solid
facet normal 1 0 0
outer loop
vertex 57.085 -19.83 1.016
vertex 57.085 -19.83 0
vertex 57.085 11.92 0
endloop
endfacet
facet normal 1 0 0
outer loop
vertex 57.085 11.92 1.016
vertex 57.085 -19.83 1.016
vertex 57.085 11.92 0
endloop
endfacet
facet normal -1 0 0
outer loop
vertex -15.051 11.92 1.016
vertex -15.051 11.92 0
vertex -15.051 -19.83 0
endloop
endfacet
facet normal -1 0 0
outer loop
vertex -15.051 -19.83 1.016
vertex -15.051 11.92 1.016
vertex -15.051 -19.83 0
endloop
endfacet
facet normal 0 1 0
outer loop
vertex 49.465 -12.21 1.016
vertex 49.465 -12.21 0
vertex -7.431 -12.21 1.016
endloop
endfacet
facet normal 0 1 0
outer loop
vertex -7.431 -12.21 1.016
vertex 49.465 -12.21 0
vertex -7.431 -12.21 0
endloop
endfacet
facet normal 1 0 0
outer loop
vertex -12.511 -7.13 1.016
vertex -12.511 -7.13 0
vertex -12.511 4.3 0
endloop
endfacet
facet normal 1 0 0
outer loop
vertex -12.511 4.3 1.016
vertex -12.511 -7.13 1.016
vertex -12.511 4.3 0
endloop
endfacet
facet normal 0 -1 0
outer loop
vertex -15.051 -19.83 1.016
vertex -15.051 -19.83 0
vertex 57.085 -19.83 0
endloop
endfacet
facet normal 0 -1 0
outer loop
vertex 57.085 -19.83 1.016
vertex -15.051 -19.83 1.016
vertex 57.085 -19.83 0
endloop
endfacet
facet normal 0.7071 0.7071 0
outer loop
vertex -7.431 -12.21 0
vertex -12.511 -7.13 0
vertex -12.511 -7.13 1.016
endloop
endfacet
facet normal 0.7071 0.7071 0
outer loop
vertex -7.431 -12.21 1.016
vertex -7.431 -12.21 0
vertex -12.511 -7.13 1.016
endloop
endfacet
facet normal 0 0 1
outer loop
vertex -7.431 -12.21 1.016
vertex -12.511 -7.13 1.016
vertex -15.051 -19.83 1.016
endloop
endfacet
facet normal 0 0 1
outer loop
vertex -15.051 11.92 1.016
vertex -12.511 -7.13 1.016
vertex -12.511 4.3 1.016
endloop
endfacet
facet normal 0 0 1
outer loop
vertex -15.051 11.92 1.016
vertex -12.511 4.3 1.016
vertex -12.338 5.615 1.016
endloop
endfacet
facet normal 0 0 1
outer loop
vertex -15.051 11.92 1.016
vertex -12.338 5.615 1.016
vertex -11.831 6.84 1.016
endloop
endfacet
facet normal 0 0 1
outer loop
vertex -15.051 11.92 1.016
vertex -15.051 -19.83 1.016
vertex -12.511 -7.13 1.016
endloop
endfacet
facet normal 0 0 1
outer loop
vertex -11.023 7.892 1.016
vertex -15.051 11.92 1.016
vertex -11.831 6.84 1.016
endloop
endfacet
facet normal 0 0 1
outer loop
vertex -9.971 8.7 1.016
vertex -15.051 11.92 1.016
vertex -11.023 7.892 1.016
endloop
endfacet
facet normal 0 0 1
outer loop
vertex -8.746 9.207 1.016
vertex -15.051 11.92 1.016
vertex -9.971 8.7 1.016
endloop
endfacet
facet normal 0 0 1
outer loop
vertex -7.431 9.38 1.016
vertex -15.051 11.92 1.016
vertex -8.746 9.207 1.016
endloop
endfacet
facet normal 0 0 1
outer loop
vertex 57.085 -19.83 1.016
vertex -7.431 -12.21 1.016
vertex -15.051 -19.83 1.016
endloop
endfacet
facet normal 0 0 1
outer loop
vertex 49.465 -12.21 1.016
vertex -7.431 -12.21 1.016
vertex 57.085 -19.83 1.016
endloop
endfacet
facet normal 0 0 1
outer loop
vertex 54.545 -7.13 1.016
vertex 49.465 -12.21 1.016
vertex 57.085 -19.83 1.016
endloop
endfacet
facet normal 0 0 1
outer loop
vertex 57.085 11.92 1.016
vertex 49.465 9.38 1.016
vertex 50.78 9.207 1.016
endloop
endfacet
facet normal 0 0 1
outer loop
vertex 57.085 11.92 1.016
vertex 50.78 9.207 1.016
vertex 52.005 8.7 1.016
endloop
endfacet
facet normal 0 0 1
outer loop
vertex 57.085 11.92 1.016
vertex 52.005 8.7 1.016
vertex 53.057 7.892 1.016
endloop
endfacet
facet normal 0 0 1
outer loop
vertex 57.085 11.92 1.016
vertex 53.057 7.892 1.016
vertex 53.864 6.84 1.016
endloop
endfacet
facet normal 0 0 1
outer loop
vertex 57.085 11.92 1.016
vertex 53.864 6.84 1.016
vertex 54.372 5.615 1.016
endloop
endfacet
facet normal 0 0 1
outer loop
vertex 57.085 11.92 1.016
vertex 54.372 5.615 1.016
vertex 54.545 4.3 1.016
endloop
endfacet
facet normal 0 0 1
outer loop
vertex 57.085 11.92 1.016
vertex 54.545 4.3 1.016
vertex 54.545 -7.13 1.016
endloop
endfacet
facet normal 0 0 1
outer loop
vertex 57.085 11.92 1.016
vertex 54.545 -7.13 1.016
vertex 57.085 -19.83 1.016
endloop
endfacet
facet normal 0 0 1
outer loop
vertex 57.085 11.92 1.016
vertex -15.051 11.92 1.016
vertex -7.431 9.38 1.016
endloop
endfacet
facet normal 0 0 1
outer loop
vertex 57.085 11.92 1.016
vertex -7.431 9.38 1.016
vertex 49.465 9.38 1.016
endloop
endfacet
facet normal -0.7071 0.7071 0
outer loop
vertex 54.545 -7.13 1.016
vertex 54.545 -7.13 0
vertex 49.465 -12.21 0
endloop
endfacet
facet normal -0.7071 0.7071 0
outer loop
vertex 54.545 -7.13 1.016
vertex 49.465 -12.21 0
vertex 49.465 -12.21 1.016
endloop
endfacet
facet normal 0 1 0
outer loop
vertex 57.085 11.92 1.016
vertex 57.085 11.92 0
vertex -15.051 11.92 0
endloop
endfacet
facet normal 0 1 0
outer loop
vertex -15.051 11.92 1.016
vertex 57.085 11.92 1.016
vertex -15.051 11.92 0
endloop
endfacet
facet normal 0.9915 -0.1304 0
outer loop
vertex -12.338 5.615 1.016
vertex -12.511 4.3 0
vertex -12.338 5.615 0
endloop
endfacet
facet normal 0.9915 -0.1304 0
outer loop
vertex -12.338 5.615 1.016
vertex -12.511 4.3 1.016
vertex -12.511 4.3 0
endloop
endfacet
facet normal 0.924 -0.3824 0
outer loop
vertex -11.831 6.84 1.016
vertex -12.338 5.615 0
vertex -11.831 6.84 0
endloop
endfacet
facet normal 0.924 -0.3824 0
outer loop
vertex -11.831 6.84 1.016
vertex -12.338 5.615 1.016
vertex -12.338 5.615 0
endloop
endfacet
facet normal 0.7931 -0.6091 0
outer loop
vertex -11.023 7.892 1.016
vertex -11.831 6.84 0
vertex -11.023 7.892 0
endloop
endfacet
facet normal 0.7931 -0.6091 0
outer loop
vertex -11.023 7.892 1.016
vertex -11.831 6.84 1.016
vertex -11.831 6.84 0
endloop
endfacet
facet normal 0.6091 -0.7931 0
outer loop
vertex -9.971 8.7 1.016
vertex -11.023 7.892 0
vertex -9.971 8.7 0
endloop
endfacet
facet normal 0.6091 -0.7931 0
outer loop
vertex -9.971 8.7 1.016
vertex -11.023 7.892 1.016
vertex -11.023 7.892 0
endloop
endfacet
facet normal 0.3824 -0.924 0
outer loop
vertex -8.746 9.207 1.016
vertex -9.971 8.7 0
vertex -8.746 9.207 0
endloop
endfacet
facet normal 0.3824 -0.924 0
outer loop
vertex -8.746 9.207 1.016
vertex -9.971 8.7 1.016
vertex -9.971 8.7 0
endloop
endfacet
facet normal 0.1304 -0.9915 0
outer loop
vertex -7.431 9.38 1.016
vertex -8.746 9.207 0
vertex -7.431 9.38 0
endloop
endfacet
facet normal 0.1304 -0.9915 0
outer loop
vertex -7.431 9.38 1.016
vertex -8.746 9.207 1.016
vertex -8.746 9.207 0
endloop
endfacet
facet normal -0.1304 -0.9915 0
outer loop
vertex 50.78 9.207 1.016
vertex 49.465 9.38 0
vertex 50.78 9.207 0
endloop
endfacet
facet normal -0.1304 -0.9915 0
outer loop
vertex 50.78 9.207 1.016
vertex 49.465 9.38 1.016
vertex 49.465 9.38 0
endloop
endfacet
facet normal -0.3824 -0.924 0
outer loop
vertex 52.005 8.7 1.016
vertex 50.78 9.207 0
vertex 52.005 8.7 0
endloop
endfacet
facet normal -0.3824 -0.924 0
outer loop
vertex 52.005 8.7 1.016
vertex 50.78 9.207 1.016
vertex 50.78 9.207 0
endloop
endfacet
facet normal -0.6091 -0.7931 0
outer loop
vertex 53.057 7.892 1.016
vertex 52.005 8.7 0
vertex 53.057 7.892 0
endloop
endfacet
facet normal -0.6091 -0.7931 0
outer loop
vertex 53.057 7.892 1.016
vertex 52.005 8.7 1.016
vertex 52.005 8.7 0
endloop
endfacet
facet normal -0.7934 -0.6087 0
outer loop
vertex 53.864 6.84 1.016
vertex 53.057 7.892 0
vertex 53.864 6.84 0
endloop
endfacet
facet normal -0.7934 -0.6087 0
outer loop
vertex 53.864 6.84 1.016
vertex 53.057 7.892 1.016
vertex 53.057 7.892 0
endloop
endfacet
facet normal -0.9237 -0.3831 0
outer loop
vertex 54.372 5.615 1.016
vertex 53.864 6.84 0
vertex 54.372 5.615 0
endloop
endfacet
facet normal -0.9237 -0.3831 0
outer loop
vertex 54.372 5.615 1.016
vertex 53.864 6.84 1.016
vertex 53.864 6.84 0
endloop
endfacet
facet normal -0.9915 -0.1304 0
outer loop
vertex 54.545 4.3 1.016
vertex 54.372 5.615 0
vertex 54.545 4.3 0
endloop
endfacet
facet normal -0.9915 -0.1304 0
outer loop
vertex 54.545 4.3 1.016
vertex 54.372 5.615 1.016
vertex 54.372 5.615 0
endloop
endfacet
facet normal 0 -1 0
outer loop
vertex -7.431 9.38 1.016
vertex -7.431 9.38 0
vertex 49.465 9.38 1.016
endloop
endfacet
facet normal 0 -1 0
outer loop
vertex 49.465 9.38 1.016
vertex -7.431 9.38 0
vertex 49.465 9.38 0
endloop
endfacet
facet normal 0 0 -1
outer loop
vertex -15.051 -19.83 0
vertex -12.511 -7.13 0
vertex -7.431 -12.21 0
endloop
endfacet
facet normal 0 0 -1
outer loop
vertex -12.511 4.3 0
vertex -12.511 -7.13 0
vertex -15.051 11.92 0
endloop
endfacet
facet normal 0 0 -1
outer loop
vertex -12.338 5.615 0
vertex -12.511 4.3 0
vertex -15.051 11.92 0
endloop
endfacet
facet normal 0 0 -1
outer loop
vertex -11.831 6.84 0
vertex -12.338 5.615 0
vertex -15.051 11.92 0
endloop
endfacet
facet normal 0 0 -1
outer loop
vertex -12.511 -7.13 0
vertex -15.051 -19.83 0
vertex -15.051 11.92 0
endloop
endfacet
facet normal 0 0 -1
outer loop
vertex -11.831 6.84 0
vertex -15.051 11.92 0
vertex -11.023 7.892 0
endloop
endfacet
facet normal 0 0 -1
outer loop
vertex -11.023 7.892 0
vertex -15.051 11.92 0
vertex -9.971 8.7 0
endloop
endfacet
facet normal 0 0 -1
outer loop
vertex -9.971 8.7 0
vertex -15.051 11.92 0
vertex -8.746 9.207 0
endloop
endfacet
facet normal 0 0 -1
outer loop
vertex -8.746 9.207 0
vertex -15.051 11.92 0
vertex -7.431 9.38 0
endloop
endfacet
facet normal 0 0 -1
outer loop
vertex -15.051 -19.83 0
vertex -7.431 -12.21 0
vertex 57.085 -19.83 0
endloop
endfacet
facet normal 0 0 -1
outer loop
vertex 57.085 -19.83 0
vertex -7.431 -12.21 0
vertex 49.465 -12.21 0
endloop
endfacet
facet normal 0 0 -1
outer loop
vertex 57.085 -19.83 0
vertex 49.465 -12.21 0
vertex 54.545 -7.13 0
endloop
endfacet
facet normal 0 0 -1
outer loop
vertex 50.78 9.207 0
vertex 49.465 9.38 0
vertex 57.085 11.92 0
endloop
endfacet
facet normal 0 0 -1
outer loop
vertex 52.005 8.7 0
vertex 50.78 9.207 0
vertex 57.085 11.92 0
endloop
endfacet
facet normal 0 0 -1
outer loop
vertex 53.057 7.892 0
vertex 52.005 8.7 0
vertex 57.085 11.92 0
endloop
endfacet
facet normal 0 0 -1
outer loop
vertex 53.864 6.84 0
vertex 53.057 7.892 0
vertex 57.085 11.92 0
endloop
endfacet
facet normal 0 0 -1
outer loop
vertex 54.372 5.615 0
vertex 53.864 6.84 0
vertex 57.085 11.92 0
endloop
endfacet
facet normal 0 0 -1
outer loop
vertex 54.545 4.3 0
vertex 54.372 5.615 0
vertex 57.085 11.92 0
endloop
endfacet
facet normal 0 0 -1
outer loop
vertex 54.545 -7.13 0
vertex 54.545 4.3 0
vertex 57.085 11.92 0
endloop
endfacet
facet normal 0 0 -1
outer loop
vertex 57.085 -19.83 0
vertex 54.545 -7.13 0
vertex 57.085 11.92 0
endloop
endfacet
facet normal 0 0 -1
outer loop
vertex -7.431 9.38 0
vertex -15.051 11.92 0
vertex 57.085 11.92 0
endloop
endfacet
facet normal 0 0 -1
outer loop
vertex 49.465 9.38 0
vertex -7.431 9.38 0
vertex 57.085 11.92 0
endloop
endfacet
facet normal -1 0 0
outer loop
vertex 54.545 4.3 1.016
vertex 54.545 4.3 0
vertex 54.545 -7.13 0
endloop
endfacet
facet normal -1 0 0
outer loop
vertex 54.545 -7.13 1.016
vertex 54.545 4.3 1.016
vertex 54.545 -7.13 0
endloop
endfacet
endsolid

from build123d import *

# Parameters (mm, degrees)
F1_DEPTH = 1.016
F2_R     = 5.08
F3_SIZE  = 5.08


with BuildPart() as f1:
    # F0 (on Top) → F1 (new body)
    with BuildSketch(Plane.XY):
        Polygon((57.084747, -19.829684), (57.084747, -12.209684), (54.544747, -12.209684), (-12.511253, -12.209684), (-15.051253, -12.209684), (-15.051253, -19.829684), align=None)
        Polygon((57.084747, -12.209684), (57.084747, 11.920316), (-15.051253, 11.920316), (-15.051253, -12.209684), (-12.511253, -12.209684), (-12.511253, 9.380316), (54.544747, 9.380316), (54.544747, -12.209684), align=None)
    extrude(amount=F1_DEPTH)

    # F2
    f2_edges = [f1.edges().sort_by_distance(p)[0] for p in [
        (-12.511253, 9.380316, 0.508),
        (54.544747, 9.380316, 0.508),
    ]]
    fillet(f2_edges, radius=F2_R)

    # F3
    f3_edges = [f1.edges().sort_by_distance(p)[0] for p in [
        (-12.511253, -12.209684, 0.508),
        (54.544747, -12.209684, 0.508),
    ]]
    chamfer(f3_edges, length=F3_SIZE)


solid = f1.part
